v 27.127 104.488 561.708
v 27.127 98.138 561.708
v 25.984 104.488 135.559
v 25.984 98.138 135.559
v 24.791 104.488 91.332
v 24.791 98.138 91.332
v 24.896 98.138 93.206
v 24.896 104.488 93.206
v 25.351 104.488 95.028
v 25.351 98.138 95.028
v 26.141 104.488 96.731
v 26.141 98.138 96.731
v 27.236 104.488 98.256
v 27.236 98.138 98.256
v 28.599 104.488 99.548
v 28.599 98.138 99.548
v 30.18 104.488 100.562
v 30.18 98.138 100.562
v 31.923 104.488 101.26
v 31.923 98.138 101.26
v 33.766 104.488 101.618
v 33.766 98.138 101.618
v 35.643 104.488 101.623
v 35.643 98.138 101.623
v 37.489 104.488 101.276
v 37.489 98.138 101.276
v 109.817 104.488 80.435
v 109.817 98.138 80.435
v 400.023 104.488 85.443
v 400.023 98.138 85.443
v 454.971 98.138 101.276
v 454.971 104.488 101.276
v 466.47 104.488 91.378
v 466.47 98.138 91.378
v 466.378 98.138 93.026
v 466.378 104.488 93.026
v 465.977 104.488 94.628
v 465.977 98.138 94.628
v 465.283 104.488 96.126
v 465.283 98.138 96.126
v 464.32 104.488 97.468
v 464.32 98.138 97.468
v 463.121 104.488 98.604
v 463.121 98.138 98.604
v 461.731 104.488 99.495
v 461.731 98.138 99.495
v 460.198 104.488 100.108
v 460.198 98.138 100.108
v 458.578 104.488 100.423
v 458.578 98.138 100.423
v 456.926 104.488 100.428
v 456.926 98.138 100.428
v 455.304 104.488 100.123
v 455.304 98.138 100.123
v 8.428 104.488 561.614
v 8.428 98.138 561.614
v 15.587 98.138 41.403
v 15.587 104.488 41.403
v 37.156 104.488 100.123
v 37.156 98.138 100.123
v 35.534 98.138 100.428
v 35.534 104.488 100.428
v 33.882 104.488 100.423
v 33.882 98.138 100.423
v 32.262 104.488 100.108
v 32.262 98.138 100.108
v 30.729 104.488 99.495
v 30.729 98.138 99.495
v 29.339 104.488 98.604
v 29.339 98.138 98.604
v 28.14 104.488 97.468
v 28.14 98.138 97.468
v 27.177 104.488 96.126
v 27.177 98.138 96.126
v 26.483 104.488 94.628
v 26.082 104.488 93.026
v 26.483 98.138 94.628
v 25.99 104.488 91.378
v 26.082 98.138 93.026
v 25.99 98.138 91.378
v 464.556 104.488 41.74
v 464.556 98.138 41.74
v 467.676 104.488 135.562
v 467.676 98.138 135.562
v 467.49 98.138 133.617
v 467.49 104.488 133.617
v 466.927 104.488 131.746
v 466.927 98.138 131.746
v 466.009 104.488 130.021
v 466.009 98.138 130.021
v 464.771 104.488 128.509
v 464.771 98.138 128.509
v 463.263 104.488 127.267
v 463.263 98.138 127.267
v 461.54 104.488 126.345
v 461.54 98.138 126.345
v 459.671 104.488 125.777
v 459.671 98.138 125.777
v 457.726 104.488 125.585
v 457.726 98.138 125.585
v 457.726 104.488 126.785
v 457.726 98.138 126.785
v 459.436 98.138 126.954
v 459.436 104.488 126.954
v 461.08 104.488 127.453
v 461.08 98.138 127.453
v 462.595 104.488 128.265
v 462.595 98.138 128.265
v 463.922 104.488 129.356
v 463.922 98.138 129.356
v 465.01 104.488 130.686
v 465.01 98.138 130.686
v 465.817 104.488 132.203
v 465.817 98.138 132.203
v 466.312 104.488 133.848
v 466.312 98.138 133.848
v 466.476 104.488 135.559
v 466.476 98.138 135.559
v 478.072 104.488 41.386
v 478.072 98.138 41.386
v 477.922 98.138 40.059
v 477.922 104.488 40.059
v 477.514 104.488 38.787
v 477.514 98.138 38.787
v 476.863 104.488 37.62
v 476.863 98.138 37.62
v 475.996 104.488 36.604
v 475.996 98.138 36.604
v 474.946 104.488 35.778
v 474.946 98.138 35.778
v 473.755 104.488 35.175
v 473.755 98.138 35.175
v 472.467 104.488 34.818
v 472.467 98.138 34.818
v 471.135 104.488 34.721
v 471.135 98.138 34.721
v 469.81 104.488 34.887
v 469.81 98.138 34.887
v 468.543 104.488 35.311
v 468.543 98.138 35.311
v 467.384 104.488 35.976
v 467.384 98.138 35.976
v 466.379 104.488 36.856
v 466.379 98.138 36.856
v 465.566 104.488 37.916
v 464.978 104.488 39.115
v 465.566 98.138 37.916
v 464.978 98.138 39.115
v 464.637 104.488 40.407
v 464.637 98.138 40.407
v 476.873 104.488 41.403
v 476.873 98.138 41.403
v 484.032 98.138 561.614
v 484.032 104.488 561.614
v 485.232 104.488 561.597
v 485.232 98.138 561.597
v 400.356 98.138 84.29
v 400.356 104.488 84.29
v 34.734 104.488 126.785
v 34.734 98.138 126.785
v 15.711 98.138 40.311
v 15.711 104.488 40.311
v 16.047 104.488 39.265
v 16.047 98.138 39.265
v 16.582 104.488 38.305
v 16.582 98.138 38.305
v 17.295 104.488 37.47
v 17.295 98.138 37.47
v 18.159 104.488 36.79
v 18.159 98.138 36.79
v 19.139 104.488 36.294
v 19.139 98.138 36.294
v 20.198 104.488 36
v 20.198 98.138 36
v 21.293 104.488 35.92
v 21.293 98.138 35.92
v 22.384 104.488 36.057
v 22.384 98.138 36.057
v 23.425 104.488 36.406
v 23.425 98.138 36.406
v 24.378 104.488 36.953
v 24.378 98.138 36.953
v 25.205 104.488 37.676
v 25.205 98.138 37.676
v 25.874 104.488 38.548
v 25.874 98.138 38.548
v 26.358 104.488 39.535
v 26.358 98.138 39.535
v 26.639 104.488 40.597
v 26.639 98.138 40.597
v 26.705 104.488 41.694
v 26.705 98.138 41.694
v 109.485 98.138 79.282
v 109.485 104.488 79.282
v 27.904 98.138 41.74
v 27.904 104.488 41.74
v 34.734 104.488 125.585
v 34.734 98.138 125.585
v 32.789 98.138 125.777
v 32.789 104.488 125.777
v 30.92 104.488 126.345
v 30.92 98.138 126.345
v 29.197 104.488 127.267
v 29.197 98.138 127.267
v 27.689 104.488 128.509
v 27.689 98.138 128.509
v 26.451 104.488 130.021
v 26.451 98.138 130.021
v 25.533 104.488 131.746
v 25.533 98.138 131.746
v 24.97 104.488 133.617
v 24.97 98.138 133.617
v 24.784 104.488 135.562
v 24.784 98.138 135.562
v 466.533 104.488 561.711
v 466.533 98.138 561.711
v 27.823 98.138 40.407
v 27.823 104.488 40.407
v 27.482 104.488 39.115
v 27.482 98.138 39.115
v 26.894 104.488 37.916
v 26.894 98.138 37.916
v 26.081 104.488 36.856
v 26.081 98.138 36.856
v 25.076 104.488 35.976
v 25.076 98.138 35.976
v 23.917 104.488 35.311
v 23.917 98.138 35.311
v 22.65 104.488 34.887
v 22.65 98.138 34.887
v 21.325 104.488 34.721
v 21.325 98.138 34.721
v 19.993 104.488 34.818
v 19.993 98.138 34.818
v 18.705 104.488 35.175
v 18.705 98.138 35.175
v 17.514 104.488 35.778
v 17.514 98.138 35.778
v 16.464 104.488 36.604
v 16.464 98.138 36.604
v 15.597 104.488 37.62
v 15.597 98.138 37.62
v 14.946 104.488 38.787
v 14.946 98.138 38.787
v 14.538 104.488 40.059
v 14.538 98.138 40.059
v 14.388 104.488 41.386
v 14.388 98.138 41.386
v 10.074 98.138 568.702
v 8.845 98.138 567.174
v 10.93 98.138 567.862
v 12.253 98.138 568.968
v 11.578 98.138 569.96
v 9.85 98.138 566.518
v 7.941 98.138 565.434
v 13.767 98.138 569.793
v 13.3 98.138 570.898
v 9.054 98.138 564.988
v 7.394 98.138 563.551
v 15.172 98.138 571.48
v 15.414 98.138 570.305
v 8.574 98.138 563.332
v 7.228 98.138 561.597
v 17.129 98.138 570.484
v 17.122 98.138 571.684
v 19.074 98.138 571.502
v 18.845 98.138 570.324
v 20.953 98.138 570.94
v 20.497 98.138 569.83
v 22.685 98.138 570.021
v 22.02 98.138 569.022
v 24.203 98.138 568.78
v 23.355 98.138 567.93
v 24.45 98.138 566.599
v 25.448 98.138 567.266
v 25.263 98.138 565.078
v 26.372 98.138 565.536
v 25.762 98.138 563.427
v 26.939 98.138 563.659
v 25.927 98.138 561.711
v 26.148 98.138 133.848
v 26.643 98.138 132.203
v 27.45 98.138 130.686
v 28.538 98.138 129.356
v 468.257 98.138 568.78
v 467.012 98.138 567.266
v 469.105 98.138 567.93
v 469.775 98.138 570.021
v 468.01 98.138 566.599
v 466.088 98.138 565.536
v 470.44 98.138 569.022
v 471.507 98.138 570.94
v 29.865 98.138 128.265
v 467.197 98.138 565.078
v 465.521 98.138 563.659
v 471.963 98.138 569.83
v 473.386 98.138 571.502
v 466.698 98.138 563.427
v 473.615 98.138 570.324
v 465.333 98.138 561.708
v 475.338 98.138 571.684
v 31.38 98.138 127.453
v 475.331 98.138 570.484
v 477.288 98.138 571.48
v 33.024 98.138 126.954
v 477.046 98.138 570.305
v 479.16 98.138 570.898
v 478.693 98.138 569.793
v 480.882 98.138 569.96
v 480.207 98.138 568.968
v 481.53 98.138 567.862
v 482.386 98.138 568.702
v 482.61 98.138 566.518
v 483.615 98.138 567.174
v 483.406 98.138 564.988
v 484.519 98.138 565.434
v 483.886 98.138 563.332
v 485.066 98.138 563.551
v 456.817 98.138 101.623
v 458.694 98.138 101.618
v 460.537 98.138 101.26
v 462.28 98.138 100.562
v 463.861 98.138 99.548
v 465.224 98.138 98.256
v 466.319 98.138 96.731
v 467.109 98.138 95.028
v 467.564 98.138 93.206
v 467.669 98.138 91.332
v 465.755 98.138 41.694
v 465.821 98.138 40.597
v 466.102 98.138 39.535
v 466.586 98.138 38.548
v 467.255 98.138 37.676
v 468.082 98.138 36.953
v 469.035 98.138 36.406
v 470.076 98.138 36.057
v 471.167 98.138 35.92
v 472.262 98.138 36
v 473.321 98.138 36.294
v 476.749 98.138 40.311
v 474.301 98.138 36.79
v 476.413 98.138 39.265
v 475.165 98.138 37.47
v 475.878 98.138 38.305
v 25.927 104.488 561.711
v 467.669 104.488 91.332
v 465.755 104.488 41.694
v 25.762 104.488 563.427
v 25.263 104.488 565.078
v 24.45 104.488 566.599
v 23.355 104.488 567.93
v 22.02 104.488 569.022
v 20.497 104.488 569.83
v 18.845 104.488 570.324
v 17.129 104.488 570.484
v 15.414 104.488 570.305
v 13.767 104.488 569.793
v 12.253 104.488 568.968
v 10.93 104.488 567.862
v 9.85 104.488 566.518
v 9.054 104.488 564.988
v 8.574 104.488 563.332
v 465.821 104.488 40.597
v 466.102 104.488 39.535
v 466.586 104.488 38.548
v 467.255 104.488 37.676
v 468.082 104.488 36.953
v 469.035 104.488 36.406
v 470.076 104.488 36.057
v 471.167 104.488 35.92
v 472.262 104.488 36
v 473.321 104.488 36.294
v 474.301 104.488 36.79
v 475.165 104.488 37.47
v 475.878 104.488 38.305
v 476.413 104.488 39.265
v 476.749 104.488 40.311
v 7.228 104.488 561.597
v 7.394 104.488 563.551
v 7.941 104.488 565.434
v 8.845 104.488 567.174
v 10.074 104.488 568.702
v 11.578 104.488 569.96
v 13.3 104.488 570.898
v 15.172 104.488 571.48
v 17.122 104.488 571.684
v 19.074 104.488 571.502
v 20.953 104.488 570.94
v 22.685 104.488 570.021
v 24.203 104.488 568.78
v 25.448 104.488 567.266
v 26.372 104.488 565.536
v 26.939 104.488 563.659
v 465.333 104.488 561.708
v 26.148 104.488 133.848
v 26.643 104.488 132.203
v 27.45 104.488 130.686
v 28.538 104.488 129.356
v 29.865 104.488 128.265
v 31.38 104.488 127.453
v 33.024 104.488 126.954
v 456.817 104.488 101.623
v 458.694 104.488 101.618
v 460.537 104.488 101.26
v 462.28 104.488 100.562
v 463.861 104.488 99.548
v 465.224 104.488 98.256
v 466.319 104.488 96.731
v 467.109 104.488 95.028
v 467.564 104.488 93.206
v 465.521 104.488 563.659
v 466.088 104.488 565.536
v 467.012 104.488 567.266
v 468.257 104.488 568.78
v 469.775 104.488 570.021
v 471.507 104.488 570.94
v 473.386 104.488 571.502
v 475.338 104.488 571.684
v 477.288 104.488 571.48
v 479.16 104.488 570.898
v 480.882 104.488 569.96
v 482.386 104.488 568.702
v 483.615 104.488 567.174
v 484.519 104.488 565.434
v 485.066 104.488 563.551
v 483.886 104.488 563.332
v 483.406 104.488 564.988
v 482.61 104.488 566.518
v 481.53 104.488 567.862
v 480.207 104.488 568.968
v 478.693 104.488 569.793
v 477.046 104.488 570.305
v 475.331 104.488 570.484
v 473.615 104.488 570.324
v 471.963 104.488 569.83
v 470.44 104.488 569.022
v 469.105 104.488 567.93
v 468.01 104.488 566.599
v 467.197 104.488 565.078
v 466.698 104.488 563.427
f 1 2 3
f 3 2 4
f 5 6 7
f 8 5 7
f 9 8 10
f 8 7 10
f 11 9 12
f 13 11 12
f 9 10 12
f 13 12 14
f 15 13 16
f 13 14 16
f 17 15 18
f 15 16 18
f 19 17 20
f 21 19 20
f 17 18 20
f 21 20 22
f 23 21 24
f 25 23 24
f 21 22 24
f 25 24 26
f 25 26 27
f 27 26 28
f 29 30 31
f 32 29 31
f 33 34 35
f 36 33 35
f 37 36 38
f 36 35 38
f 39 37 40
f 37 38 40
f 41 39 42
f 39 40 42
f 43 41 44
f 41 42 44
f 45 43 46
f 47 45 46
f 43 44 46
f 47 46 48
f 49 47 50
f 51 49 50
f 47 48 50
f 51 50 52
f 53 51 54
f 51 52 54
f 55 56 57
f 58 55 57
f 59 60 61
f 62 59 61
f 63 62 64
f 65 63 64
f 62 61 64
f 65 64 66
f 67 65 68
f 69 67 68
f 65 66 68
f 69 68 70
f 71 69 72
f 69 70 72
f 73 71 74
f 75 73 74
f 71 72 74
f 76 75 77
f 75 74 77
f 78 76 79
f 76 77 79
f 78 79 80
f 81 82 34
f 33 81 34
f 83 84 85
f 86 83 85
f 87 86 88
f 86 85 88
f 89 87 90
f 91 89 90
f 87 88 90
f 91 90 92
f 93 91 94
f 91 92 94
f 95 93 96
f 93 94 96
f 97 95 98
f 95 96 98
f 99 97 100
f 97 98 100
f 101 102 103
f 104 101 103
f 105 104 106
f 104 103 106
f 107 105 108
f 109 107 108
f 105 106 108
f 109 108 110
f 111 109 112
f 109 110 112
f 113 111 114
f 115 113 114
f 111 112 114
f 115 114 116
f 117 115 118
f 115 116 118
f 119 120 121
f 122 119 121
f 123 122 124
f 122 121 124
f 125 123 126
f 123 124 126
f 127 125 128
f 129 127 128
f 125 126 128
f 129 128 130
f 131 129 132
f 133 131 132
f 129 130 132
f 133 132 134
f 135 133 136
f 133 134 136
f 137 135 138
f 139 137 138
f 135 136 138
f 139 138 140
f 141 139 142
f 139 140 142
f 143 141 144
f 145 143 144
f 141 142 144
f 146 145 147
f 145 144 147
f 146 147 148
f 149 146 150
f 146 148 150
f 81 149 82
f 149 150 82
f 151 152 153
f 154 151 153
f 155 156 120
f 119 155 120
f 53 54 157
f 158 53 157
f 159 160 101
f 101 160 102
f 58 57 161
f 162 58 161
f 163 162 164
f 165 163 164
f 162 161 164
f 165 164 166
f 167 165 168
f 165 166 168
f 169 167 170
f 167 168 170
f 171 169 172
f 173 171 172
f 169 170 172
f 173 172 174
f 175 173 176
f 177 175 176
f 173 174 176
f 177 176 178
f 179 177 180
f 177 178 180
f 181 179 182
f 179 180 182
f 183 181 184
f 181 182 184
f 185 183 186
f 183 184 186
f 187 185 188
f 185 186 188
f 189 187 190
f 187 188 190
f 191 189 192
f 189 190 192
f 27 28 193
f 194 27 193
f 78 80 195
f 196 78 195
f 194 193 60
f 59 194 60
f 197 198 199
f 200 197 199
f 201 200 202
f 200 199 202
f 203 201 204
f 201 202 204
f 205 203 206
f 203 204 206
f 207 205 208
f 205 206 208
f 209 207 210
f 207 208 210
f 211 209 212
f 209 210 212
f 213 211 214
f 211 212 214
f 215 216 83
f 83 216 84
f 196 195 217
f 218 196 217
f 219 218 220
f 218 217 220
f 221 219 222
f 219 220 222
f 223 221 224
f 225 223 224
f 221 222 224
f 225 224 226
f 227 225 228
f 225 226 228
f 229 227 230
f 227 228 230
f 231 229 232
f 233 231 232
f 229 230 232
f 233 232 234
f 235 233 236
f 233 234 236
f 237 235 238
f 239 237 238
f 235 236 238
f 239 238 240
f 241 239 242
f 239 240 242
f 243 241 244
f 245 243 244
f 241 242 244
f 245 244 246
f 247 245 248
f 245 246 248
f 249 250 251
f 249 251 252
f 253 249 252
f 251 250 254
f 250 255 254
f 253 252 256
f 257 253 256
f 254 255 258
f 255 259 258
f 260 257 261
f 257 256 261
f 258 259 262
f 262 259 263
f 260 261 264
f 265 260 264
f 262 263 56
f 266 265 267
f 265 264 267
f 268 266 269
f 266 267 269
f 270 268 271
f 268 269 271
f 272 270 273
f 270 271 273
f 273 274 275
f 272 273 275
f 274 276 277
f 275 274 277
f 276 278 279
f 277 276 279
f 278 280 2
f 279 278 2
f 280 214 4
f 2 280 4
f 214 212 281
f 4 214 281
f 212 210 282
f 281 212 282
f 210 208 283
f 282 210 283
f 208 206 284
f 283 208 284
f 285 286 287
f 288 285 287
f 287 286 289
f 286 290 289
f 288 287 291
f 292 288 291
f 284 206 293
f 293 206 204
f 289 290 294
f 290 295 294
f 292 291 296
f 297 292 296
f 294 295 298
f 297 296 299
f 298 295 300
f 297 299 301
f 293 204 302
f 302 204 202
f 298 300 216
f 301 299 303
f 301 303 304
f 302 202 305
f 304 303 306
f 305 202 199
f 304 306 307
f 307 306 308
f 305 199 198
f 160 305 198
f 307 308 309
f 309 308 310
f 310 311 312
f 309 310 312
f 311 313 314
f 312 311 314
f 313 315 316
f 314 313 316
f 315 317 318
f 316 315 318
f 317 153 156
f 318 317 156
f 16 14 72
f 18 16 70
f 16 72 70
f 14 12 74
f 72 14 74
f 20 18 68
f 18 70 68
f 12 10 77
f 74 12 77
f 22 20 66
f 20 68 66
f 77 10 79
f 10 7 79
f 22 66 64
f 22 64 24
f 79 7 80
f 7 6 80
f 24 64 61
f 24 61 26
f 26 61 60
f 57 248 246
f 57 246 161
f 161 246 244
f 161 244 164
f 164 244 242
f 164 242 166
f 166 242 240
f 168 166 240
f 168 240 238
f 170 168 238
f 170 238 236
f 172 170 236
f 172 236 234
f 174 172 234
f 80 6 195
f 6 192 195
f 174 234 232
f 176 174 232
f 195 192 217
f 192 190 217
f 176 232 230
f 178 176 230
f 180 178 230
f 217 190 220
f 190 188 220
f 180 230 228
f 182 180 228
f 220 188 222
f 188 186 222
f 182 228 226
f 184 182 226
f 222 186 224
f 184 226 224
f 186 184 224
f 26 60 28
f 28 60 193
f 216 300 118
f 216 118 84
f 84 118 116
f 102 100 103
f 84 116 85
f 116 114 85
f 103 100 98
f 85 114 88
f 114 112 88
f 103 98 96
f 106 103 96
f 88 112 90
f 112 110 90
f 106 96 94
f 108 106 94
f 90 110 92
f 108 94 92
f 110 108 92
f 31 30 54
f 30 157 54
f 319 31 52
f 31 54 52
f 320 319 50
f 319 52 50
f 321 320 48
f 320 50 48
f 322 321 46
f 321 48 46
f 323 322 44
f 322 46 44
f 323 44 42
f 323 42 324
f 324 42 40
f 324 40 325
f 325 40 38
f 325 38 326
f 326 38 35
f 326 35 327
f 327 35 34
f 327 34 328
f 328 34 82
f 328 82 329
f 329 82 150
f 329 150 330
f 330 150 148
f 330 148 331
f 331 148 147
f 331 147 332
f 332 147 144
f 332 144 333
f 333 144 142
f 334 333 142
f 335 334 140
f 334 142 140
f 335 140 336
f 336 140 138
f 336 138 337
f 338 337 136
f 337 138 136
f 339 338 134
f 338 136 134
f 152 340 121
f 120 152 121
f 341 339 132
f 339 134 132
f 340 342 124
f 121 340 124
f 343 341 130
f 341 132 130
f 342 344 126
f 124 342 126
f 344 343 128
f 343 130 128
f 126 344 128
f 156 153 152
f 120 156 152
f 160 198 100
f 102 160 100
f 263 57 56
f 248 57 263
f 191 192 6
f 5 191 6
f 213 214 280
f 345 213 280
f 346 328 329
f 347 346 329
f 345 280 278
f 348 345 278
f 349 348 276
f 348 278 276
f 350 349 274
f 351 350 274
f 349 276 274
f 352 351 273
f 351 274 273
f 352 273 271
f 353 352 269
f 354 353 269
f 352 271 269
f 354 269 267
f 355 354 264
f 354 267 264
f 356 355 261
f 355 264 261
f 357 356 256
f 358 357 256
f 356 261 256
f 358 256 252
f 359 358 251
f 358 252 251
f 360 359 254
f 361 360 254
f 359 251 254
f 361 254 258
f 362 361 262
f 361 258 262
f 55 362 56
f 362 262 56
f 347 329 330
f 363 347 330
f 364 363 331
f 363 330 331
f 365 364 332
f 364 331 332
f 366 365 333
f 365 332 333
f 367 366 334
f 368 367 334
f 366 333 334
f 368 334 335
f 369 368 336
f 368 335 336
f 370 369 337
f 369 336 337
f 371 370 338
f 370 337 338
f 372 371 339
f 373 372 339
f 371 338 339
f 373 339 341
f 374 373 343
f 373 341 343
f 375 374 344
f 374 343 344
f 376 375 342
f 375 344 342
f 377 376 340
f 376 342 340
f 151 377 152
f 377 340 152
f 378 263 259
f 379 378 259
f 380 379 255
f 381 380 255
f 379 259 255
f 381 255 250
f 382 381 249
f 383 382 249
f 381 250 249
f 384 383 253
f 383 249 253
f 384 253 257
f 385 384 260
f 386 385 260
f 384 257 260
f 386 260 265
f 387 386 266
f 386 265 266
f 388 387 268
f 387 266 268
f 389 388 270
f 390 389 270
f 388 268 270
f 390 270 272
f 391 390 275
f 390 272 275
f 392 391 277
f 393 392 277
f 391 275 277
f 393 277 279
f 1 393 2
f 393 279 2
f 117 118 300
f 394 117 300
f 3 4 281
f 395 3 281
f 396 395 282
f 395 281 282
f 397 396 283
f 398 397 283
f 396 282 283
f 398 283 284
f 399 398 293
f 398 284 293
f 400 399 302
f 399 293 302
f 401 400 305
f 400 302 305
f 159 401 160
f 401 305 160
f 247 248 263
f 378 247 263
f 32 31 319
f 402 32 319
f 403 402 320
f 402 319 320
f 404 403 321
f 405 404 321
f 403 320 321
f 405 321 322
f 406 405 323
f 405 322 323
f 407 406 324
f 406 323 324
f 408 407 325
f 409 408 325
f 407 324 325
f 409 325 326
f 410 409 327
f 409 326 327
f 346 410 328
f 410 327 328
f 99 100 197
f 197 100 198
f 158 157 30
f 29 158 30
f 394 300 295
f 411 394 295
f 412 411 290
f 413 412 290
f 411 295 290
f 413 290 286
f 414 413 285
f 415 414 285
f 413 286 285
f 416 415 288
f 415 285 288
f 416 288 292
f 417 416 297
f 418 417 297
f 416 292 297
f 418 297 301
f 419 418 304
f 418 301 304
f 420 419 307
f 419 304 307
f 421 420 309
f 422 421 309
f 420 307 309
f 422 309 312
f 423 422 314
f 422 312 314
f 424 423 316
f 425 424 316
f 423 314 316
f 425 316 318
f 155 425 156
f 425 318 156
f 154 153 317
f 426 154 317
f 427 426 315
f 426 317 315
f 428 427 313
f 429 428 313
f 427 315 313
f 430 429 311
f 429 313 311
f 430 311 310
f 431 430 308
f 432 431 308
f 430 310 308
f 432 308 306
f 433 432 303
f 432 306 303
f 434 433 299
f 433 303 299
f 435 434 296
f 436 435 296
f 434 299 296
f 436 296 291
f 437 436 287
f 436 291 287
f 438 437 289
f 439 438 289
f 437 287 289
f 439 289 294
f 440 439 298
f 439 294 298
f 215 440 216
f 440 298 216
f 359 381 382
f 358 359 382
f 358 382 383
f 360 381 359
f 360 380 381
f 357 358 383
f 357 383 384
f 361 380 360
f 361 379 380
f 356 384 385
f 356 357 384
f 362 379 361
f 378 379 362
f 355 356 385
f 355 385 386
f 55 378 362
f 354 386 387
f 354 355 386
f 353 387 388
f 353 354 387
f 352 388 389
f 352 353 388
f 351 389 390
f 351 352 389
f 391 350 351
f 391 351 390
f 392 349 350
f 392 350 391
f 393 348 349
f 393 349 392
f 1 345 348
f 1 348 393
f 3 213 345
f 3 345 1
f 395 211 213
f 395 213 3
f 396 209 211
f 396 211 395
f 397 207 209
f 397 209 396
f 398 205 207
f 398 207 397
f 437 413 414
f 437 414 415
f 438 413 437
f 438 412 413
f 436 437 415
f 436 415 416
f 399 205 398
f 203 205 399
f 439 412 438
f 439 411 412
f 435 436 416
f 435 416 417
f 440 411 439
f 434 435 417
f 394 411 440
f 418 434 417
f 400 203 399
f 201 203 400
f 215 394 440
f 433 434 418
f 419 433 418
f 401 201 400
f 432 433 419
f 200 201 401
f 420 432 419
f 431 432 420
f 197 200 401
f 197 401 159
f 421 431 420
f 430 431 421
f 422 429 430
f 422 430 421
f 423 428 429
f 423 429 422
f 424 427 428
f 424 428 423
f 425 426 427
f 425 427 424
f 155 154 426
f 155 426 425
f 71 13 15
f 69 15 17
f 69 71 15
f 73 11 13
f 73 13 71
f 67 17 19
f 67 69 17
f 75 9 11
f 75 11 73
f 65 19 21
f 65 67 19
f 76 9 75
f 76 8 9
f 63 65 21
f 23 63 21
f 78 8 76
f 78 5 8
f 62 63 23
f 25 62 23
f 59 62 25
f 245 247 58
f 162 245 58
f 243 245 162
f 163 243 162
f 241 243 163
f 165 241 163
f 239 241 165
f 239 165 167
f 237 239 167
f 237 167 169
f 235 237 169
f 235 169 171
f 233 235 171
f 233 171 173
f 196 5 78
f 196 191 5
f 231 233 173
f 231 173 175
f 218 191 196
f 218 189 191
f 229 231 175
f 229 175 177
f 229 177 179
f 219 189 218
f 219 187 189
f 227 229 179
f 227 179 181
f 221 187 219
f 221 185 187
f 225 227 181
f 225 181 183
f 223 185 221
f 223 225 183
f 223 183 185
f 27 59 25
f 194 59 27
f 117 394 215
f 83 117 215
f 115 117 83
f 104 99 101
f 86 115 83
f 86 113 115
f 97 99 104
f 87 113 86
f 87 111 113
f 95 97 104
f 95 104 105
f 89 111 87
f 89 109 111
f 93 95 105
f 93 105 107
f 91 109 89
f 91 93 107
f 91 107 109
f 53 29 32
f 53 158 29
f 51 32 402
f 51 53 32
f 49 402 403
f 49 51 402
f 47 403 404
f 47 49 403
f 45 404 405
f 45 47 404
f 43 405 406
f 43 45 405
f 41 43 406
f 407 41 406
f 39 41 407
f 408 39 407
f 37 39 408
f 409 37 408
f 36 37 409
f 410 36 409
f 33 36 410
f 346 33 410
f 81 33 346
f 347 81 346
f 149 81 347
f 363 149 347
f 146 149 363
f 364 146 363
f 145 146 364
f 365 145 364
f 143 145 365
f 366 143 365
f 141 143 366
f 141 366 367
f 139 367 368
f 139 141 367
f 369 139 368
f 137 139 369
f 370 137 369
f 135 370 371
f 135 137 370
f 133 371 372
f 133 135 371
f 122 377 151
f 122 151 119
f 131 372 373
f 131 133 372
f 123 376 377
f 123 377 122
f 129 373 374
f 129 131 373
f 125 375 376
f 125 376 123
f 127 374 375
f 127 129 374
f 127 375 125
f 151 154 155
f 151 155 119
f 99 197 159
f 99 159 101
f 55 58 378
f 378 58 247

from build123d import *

# Parameters (mm, degrees)
EXTRUDE_THIN1_START = 98.137598
EXTRUDE_THIN1_DEPTH = 6.35


with BuildPart() as part:
    # Sketch1 → Extrude-Thin1 (new body)
    with BuildSketch(Plane(origin=(0, 0, 0), x_dir=(1, 0, 0), z_dir=(0, 1, 0)).offset(EXTRUDE_THIN1_START)):
        with BuildLine():
            Line((400.023485906, -85.443361152), (454.971450984, -101.27596863))
            ThreePointArc((454.971450984, -101.27596863), (463.861362415, -99.548472953), (467.668957804, -91.331601045))
            Line((467.668957804, -91.331601045), (465.755105618, -41.69369751))
            ThreePointArc((465.755105618, -41.69369751), (471.16659983, -35.920320597), (476.872500072, -41.402916061))
            Line((476.872500072, -41.402916061), (484.032084809, -561.613939409))
            ThreePointArc((484.032084809, -561.613939409), (475.331383816, -570.484218666), (466.532944878, -561.710876992))
            Line((466.532944878, -561.710876992), (467.676291292, -135.561743547))
            ThreePointArc((467.676291292, -135.561743547), (464.771471532, -128.508780211), (457.726327103, -125.585048067))
            Line((457.726327103, -125.585048067), (217.954761626, -125.585048067))
            Line((217.954761626, -125.585048067), (34.733672902, -125.585048067))
            ThreePointArc((34.733672902, -125.585048067), (27.688528473, -128.508780211), (24.783708713, -135.561743547))
            Line((24.783708713, -135.561743547), (25.927055127, -561.710876992))
            ThreePointArc((25.927055127, -561.710876992), (17.128616189, -570.484218666), (8.427915196, -561.613939409))
            Line((8.427915196, -561.613939409), (15.587499933, -41.402916061))
            ThreePointArc((15.587499933, -41.402916061), (21.293400175, -35.920320597), (26.704894387, -41.69369751))
            Line((26.704894387, -41.69369751), (24.791042201, -91.331601045))
            ThreePointArc((24.791042201, -91.331601045), (28.59863759, -99.548472953), (37.488549021, -101.27596863))
            Line((37.488549021, -101.27596863), (109.817026065, -80.435371805))
            Line((109.817026065, -80.435371805), (109.4847775, -79.282284258))
            Line((109.4847775, -79.282284258), (37.156300457, -100.122881082))
            ThreePointArc((37.156300457, -100.122881082), (29.338539147, -98.603726593), (25.990151243, -91.377834212))
            Line((25.990151243, -91.377834212), (27.904003429, -41.739930677))
            ThreePointArc((27.904003429, -41.739930677), (21.324776092, -34.720730854), (14.387613566, -41.386402209))
            Line((14.387613566, -41.386402209), (7.22802883, -561.597425557))
            ThreePointArc((7.22802883, -561.597425557), (17.121968816, -571.684200254), (27.127050808, -561.707657437))
            Line((27.127050808, -561.707657437), (25.983704394, -135.558523992))
            ThreePointArc((25.983704394, -135.558523992), (28.538194133, -129.356169299), (34.733672902, -126.785048067))
            Line((34.733672902, -126.785048067), (217.954761626, -126.785048067))
            Line((217.954761626, -126.785048067), (457.726327103, -126.785048067))
            ThreePointArc((457.726327103, -126.785048067), (463.921805872, -129.356169299), (466.476295611, -135.558523992))
            Line((466.476295611, -135.558523992), (465.332949197, -561.707657437))
            ThreePointArc((465.332949197, -561.707657437), (475.338031189, -571.684200254), (485.231971175, -561.597425557))
            Line((485.231971175, -561.597425557), (478.072386439, -41.386402209))
            ThreePointArc((478.072386439, -41.386402209), (471.135223913, -34.720730854), (464.555996576, -41.739930677))
            Line((464.555996576, -41.739930677), (466.469848762, -91.377834212))
            ThreePointArc((466.469848762, -91.377834212), (463.121460857, -98.603726593), (455.303699548, -100.122881082))
            Line((455.303699548, -100.122881082), (400.355734471, -84.290273604))
            Line((400.355734471, -84.290273604), (400.023485906, -85.443361152))
        make_face()
    extrude(amount=EXTRUDE_THIN1_DEPTH)


solid = part.part
